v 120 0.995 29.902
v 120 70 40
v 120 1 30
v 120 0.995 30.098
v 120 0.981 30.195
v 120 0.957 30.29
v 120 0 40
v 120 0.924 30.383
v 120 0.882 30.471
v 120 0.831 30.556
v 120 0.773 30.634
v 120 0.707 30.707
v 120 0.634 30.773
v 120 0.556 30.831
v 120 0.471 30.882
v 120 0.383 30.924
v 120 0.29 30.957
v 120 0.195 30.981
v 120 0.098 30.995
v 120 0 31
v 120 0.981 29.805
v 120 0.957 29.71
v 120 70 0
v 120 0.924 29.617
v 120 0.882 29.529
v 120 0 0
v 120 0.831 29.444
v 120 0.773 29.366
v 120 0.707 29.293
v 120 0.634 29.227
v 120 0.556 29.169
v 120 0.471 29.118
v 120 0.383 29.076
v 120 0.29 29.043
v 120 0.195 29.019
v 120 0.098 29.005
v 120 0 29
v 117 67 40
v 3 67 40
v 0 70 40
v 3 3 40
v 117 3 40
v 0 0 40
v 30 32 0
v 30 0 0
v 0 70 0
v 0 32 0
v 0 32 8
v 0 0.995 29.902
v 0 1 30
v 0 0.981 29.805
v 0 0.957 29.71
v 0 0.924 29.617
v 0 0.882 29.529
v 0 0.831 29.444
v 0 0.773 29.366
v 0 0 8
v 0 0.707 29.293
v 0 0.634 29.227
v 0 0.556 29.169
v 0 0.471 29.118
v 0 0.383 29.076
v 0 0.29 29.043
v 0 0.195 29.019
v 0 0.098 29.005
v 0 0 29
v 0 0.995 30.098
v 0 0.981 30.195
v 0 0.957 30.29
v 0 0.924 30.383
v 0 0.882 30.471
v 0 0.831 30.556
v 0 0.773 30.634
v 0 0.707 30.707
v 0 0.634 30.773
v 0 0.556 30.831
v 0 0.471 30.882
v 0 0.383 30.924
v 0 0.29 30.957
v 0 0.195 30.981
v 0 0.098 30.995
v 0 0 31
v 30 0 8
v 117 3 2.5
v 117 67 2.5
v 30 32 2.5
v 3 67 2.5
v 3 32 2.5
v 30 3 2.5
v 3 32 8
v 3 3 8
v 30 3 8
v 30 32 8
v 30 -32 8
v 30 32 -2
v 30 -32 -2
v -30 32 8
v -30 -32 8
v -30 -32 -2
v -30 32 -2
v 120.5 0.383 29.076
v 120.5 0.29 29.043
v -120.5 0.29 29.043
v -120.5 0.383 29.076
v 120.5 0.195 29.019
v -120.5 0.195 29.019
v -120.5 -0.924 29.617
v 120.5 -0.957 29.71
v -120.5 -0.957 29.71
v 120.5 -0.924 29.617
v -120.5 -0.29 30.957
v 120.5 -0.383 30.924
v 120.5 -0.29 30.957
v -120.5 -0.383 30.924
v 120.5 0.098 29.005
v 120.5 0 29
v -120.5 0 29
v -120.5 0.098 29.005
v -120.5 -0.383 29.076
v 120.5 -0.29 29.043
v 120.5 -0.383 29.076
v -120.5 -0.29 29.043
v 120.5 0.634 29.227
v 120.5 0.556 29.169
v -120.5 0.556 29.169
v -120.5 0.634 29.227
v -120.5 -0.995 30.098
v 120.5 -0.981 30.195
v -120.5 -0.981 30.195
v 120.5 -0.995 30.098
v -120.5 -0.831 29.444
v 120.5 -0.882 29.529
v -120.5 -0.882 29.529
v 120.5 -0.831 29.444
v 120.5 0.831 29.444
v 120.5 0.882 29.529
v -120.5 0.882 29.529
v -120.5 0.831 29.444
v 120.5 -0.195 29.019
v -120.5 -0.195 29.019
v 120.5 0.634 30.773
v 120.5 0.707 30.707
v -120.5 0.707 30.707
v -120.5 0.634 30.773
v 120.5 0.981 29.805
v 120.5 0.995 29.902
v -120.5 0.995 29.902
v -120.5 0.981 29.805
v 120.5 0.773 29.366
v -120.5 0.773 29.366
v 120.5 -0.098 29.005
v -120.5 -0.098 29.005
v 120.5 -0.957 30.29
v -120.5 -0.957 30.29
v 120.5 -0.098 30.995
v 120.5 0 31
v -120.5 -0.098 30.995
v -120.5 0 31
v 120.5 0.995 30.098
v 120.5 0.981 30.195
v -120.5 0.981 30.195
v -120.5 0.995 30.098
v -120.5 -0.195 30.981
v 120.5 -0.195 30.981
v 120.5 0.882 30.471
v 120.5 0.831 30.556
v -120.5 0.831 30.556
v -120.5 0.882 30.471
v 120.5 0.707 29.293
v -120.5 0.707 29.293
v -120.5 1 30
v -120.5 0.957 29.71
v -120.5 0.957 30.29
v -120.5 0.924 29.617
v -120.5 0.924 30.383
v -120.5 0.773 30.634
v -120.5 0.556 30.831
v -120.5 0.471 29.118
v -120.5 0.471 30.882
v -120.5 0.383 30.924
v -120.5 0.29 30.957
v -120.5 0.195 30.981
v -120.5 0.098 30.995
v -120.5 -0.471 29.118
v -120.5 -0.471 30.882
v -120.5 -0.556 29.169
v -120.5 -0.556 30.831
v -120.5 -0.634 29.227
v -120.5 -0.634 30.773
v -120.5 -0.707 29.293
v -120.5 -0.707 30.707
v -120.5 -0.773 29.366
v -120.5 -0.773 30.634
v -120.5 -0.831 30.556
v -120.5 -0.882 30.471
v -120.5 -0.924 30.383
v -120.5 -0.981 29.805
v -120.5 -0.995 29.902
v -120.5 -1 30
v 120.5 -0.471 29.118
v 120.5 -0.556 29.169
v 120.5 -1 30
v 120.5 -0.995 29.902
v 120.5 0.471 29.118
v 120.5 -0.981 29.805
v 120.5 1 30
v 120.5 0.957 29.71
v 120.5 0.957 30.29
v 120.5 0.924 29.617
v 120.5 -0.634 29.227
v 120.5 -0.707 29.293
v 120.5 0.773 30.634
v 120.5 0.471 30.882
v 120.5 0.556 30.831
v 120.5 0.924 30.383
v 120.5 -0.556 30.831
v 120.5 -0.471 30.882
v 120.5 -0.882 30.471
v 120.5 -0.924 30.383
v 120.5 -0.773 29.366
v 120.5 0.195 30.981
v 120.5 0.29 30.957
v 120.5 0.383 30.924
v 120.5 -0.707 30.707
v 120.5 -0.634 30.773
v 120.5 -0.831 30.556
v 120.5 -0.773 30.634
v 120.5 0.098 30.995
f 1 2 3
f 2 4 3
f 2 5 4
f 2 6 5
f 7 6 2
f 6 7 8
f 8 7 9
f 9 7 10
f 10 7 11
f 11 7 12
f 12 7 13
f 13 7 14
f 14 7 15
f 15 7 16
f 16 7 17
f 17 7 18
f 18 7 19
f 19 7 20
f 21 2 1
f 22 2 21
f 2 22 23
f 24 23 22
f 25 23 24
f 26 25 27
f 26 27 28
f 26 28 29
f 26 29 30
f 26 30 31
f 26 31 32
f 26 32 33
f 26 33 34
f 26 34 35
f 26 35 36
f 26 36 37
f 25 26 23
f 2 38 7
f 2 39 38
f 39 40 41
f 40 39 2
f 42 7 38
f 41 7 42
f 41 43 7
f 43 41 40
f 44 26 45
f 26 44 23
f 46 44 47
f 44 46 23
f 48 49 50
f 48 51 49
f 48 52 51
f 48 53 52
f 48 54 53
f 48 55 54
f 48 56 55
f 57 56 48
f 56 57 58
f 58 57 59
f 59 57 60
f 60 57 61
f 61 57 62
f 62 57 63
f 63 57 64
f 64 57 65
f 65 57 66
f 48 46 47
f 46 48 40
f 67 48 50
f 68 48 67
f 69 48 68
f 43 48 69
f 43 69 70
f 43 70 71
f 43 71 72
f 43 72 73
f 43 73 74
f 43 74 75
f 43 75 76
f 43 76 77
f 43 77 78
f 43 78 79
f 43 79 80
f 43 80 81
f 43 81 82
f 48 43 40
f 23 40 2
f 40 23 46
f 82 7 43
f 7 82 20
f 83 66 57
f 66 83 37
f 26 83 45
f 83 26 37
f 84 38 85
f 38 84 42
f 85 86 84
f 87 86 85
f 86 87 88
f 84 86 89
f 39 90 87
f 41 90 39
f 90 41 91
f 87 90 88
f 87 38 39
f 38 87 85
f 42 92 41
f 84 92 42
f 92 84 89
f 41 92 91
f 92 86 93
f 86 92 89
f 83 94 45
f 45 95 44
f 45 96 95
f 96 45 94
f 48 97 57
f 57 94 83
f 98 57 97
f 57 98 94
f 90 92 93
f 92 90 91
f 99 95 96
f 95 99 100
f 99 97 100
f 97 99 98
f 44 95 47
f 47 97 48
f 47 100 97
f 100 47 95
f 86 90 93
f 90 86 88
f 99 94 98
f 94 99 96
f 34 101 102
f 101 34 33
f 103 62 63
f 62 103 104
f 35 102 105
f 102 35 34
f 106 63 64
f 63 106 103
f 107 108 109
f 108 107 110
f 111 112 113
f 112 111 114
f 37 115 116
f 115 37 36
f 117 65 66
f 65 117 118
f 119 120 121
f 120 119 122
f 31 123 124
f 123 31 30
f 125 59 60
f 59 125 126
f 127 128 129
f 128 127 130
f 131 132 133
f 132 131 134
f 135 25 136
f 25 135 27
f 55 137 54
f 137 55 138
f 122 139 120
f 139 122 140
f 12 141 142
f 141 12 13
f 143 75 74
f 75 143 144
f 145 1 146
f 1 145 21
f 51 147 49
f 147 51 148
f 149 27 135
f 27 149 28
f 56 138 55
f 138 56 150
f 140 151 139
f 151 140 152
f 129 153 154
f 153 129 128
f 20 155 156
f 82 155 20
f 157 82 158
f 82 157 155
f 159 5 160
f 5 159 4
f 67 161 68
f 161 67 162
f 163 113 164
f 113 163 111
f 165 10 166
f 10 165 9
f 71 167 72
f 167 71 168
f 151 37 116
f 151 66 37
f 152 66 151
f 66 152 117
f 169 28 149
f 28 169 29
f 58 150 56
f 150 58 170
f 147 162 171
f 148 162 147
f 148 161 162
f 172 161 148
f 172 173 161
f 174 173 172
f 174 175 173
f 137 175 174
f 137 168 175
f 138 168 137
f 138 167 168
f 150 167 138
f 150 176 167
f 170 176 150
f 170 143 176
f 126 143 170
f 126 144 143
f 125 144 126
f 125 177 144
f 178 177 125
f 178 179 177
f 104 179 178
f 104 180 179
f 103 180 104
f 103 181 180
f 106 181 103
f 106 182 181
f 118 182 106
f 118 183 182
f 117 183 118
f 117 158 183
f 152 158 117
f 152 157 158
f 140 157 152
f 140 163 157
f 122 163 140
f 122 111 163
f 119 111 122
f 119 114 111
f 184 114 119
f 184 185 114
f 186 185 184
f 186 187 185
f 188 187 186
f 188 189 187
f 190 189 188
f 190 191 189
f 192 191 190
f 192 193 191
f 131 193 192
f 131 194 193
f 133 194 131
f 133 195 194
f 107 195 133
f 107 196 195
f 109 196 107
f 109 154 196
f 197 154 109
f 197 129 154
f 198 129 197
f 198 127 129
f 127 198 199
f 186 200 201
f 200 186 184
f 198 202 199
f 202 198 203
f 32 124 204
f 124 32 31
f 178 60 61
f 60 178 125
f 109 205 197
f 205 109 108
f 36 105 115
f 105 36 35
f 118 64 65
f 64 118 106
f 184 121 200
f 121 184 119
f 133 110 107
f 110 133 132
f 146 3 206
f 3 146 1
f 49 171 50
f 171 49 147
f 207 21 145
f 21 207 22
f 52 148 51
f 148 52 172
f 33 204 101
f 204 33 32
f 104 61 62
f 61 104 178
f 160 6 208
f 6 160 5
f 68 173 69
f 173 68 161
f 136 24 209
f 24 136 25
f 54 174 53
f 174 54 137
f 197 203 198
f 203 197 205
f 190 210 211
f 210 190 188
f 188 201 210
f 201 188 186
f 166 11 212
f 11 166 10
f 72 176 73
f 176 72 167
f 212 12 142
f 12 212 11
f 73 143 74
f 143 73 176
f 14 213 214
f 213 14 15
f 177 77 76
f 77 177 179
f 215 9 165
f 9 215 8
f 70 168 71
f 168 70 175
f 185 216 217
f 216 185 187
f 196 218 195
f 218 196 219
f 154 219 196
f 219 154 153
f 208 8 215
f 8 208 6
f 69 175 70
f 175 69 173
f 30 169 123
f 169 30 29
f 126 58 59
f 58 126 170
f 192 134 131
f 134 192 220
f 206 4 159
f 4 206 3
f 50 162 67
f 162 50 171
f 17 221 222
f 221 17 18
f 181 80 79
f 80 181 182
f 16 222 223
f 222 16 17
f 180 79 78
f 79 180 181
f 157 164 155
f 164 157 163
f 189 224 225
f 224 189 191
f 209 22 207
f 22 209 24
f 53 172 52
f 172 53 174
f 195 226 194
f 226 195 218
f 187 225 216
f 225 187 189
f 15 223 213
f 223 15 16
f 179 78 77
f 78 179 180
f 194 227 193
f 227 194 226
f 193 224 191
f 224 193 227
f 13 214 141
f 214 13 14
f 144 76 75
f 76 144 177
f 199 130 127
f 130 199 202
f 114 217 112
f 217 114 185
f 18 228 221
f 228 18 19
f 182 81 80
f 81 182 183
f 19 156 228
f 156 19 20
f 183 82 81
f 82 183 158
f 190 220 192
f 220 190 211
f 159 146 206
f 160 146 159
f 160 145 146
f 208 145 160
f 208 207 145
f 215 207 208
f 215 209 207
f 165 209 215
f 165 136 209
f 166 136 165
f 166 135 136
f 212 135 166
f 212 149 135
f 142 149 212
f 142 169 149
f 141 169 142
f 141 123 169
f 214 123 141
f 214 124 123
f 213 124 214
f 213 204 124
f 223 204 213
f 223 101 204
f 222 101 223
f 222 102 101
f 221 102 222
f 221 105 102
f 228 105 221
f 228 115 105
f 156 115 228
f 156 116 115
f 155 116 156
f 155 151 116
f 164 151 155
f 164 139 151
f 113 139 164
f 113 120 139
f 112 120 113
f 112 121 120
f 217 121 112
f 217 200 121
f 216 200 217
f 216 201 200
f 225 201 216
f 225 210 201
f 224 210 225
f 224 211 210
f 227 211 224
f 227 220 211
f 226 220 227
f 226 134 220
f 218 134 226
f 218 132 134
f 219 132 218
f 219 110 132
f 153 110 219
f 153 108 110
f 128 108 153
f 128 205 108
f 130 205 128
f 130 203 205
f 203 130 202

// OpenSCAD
// Buffer tank for mini horizontal gel-electrophoresis box
// Dimensions measured with calipers

// Outer dimensions
outer_x = 120;
outer_y = 70;
outer_z = 40;

// Wall and floor thickness
wall_thickness = 3;
floor_thickness = 3;

// Inner dimensions (derived)
inner_x = outer_x - 2 * wall_thickness;
inner_y = outer_y - 2 * wall_thickness;
inner_z = outer_z - floor_thickness;

// Gel tray platform
platform_x = 60;
platform_y = inner_y; // spans full inner width
platform_z = 10; // height above inner floor
platform_z_top = floor_thickness + platform_z; // absolute z of top surface (13)

// Electrode wire holes
hole_diameter = 2;
hole_y = 0; // centred in Y
hole_z = 30; // absolute z

// Resolution for curved shapes
$fn = 64;

// Main tank body (outer shell minus inner cavity)
// The tank sits on z=0.
difference() {
    // Outer block sitting on z=0
    translate([0, 0, 0])
        cube([outer_x, outer_y, outer_z], center = false);
    
    // Inner cavity (open top)
    // Starts at z = floor_thickness, goes up to z = outer_z + small extension
    translate([wall_thickness, wall_thickness, floor_thickness - 0.5])
        cube([inner_x, inner_y, outer_z - floor_thickness + 1], center = false);
}

// Gel tray platform (solid raised structure in the middle)
// Centered in X and Y, sitting on the floor (z = floor_thickness)
translate([0, 0, floor_thickness])
    cube([platform_x, platform_y, platform_z], center = true);

// Electrode wire holes through end walls
// Left end wall hole
translate([-outer_x/2, hole_y, hole_z])
    rotate([0, 90, 0])
        cylinder(r = hole_diameter/2, h = outer_x + 1, center = true);

// Right end wall hole
translate([outer_x/2, hole_y, hole_z])
    rotate([0, 90, 0])
        cylinder(r = hole_diameter/2, h = outer_x + 1, center = true);
